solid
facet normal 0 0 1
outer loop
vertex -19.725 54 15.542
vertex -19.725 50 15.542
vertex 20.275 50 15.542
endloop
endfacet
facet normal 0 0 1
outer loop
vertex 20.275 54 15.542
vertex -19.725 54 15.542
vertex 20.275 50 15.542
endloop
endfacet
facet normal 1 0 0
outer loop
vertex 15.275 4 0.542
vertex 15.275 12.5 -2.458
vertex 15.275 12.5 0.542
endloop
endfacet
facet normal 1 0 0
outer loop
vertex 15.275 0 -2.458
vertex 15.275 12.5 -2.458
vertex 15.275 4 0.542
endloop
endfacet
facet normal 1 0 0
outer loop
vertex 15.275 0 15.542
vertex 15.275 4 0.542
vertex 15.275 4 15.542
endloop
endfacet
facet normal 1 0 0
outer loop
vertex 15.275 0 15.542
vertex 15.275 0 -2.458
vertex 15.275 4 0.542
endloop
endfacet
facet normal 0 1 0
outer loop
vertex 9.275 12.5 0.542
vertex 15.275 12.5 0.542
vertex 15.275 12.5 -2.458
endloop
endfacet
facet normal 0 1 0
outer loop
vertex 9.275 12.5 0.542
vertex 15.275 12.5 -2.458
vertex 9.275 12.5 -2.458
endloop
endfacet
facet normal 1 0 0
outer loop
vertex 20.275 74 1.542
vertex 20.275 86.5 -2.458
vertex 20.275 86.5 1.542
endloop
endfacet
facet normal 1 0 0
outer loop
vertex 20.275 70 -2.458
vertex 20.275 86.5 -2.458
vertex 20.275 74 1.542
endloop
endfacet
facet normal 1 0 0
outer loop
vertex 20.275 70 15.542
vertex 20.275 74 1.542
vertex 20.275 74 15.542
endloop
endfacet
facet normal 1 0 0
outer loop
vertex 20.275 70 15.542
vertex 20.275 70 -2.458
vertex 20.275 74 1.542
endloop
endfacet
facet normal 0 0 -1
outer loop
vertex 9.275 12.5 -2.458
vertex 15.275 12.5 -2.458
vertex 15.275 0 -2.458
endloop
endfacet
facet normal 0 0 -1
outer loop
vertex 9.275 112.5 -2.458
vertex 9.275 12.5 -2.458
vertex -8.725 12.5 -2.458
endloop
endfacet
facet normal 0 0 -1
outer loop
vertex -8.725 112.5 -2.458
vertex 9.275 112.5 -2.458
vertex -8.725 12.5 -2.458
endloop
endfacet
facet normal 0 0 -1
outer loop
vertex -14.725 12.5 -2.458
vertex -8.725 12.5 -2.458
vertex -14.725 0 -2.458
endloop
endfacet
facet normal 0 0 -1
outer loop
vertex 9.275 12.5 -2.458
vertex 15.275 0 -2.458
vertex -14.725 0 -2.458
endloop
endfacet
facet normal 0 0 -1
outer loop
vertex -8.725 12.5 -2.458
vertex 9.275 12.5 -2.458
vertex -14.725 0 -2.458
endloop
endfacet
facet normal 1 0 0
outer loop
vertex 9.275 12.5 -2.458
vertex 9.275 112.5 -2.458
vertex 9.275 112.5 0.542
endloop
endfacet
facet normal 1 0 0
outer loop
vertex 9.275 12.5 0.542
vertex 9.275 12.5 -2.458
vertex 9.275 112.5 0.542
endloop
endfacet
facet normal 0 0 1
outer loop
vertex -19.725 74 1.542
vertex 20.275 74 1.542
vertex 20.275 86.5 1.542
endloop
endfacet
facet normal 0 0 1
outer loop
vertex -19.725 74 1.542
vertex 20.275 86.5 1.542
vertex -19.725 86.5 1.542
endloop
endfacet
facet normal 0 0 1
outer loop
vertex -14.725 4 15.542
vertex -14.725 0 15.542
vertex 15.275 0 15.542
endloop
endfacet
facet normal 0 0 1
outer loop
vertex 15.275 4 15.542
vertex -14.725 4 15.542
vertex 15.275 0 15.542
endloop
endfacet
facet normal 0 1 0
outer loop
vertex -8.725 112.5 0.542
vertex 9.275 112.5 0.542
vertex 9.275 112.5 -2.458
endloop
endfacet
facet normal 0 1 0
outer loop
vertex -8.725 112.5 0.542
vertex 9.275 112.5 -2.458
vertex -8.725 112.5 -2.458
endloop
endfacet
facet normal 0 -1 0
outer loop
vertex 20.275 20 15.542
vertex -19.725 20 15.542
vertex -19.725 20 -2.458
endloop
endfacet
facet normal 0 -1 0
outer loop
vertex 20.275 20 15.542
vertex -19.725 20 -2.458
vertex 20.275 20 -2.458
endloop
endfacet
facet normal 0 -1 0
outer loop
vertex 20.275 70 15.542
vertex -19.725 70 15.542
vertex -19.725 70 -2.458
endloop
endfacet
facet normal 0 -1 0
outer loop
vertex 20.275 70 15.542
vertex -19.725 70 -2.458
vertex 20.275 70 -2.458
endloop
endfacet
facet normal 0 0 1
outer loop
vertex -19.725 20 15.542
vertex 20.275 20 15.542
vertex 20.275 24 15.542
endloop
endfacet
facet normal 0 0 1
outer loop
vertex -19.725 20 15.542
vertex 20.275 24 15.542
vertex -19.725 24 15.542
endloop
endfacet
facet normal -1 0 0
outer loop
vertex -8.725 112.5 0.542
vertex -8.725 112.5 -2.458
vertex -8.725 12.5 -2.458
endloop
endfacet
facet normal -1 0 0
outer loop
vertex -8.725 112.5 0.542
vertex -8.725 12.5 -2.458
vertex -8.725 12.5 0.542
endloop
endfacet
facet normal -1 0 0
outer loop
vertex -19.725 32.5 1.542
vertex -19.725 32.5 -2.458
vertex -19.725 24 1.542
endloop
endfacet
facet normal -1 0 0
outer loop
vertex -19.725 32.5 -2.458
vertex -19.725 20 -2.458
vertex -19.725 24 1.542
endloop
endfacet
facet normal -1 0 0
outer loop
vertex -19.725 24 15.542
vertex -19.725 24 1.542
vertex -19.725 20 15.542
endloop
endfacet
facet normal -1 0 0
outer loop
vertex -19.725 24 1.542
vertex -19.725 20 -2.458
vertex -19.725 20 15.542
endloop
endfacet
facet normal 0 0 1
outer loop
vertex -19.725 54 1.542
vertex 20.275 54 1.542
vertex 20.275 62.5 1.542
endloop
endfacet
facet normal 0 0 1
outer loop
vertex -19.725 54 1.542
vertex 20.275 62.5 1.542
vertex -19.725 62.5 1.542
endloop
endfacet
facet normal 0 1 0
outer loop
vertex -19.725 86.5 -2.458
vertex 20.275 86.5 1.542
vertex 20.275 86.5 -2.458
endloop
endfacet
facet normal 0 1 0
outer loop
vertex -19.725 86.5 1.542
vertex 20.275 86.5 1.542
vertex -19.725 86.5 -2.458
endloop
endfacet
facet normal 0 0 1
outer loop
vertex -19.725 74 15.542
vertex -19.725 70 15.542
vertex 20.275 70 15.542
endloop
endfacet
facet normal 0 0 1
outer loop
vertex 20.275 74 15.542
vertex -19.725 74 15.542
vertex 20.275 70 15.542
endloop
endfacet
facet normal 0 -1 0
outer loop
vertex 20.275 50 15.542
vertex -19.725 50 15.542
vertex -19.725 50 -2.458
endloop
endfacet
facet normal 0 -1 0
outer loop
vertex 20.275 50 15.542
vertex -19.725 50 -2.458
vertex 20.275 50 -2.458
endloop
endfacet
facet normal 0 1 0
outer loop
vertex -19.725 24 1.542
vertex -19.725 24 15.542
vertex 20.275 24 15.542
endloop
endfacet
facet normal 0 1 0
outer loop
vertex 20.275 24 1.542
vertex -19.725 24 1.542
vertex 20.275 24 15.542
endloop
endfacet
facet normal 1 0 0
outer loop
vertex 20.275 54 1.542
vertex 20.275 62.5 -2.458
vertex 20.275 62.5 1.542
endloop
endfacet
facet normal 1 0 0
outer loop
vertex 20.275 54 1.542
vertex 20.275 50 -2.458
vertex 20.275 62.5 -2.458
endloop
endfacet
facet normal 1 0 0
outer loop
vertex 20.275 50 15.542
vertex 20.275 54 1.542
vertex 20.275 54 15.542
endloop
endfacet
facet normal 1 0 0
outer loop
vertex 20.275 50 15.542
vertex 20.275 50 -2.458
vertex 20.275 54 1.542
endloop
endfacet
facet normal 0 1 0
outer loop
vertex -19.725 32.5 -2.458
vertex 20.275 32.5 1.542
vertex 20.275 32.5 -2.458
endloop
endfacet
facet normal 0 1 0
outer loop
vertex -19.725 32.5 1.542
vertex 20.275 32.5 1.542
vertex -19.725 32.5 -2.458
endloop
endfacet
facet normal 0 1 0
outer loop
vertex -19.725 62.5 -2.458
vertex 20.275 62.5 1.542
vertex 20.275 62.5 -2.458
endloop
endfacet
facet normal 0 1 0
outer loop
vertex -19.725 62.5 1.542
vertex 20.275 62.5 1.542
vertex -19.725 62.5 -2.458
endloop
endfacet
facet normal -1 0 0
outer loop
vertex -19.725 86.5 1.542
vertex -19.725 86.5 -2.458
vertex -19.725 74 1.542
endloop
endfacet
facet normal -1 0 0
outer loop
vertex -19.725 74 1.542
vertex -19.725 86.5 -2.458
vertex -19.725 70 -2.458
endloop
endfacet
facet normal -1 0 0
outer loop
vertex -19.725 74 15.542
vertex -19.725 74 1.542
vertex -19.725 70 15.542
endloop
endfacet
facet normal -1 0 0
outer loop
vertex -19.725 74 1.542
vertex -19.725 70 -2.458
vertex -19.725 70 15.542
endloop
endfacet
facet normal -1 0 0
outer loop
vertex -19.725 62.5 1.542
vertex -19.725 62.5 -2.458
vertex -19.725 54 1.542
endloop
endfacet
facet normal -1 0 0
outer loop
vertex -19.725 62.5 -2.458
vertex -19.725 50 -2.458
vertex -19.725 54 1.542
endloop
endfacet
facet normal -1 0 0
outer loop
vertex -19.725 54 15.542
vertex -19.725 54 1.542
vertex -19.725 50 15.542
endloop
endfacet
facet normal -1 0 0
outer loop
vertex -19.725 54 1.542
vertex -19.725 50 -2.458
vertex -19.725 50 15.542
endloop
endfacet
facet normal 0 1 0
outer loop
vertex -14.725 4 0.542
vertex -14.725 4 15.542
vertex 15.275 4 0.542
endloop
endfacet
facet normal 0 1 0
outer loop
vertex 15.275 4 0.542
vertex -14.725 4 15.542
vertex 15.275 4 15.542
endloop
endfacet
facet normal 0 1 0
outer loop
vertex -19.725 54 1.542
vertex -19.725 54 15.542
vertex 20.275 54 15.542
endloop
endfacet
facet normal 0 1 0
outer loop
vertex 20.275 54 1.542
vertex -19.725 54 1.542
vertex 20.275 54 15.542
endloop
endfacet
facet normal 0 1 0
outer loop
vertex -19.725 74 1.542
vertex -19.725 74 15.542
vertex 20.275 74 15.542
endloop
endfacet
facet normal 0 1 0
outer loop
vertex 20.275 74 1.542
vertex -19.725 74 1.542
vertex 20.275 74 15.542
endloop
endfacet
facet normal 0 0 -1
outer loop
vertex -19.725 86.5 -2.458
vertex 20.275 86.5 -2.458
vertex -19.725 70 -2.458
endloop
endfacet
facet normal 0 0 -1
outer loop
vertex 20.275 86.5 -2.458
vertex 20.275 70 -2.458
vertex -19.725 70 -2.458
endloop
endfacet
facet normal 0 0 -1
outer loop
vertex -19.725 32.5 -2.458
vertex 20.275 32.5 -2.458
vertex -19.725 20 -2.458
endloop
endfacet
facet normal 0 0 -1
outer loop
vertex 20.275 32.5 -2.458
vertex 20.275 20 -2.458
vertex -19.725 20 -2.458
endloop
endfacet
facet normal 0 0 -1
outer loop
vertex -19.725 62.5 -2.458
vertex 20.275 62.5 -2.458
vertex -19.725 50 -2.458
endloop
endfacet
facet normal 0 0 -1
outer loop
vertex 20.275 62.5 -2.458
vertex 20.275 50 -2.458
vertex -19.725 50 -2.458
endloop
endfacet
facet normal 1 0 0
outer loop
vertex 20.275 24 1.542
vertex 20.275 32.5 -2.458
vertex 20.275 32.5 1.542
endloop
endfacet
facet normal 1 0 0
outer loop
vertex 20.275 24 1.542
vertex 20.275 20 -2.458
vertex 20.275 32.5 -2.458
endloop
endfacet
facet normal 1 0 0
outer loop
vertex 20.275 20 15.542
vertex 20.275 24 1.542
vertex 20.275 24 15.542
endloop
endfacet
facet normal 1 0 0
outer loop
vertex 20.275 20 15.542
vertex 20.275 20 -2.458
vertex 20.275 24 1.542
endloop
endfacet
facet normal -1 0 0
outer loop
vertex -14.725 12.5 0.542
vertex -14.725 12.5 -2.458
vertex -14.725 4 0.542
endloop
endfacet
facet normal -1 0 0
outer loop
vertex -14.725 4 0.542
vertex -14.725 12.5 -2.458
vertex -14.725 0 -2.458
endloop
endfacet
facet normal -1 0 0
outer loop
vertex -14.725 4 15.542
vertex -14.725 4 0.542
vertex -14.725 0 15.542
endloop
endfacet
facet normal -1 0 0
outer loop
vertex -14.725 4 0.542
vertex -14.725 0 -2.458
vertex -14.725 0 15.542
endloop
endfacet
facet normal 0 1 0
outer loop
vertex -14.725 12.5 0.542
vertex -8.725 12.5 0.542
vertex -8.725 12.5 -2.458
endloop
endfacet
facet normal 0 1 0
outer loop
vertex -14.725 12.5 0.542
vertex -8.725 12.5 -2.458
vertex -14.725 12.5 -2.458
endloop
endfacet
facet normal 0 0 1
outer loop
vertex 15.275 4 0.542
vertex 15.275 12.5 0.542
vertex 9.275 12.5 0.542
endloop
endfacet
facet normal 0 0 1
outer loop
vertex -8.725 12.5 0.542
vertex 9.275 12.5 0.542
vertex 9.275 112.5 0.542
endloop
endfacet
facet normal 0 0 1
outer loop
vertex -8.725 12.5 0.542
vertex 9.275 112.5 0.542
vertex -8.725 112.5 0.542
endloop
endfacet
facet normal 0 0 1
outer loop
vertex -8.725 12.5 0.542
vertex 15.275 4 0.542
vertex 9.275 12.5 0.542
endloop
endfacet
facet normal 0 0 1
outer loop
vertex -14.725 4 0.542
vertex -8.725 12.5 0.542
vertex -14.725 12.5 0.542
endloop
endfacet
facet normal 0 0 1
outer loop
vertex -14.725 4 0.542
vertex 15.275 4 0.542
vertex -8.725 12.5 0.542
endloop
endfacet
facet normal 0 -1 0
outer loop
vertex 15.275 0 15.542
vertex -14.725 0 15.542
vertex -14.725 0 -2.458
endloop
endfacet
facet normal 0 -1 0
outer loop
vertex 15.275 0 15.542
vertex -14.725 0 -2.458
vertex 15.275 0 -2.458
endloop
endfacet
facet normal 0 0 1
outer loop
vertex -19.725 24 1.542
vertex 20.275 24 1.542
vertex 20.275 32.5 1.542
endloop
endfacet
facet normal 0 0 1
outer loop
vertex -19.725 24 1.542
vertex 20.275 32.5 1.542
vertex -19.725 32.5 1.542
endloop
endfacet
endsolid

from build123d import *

# Parameters (mm, degrees)
F0_W      = 30
F0_H      = 18
F1_DEPTH  = 4
F2_W      = 30
F2_H      = 3
F3_DEPTH  = 8.5
F4_W      = 18
F4_H      = 3
F5_DEPTH  = 100
F7_START  = -20
F6_W      = 5
F6_H      = 18
F6_W_2    = 30
F7_DEPTH  = 4
F8_START  = -50
F6_W_3    = 40
F8_DEPTH  = 4
F9_START  = -70
F9_DEPTH  = 4
F10_W     = 40
F10_H     = 4
F11_DEPTH = 8.5
F12_W     = 40
F12_H     = 4
F13_DEPTH = 8.5
F14_W     = 40
F14_H     = 4
F15_DEPTH = 12.5


with BuildPart() as f1:
    # F0 (on Front) → F1 (new body)
    with BuildSketch(Plane.XZ):
        with Locations((0.2753492445, 6.5423582021)):
            Rectangle(F0_W, F0_H)
    extrude(amount=-F1_DEPTH)

    # F2 (on face) → F3 (join)
    with BuildSketch(Plane(origin=(0, 4, 0), x_dir=(-1, 0, 0), z_dir=(0, 1, 0))):
        with Locations((-0.2753492445, -0.9576417979)):
            Rectangle(F2_W, F2_H)
    extrude(amount=F3_DEPTH)

    # F4 (on face) → F5 (join)
    with BuildSketch(Plane(origin=(0, 12.5, 0), x_dir=(-1, 0, 0), z_dir=(0, 1, 0))):
        with Locations((-0.2753492445, -0.9576417979)):
            Rectangle(F4_W, F4_H)
    extrude(amount=F5_DEPTH)


with BuildPart() as f7:
    # F6 (on face) → F7 (new body)
    with BuildSketch(Plane.XZ.offset(F7_START)):
        with Locations((-17.2246507555, 6.5423582021)):
            Rectangle(F6_W, F6_H)
        with Locations((0.2753492445, 6.5423582021)):
            Rectangle(F6_W_2, F6_H)
        with Locations((17.7753492445, 6.5423582021)):
            Rectangle(F6_W, F6_H)
    extrude(amount=-F7_DEPTH)

    # F10 (on face) → F11 (join)
    with BuildSketch(Plane(origin=(0, 24, 0), x_dir=(-1, 0, 0), z_dir=(0, 1, 0))):
        with Locations((-0.2753492445, -0.4576417979)):
            Rectangle(F10_W, F10_H)
    extrude(amount=F11_DEPTH)


with BuildPart() as f8:
    # F6 (on face) → F8 (new body)
    with BuildSketch(Plane.XZ.offset(F8_START)):
        with Locations((0.2753492445, 6.5423582021)):
            Rectangle(F6_W_3, F6_H)
    extrude(amount=-F8_DEPTH)

    # F12 (on face) → F13 (join)
    with BuildSketch(Plane(origin=(0, 54, 0), x_dir=(-1, 0, 0), z_dir=(0, 1, 0))):
        with Locations((-0.2753492445, -0.4576417979)):
            Rectangle(F12_W, F12_H)
    extrude(amount=F13_DEPTH)


with BuildPart() as f9:
    # F6 (on face) → F9 (new body)
    with BuildSketch(Plane.XZ.offset(F9_START)):
        with Locations((0.2753492445, 6.5423582021)):
            Rectangle(F6_W_3, F6_H)
    extrude(amount=-F9_DEPTH)

    # F14 (on face) → F15 (join)
    with BuildSketch(Plane(origin=(0, 74, 0), x_dir=(-1, 0, 0), z_dir=(0, 1, 0))):
        with Locations((-0.2753492445, -0.4576417979)):
            Rectangle(F14_W, F14_H)
    extrude(amount=F15_DEPTH)


solid = Compound([f1.part, f7.part, f8.part, f9.part])
